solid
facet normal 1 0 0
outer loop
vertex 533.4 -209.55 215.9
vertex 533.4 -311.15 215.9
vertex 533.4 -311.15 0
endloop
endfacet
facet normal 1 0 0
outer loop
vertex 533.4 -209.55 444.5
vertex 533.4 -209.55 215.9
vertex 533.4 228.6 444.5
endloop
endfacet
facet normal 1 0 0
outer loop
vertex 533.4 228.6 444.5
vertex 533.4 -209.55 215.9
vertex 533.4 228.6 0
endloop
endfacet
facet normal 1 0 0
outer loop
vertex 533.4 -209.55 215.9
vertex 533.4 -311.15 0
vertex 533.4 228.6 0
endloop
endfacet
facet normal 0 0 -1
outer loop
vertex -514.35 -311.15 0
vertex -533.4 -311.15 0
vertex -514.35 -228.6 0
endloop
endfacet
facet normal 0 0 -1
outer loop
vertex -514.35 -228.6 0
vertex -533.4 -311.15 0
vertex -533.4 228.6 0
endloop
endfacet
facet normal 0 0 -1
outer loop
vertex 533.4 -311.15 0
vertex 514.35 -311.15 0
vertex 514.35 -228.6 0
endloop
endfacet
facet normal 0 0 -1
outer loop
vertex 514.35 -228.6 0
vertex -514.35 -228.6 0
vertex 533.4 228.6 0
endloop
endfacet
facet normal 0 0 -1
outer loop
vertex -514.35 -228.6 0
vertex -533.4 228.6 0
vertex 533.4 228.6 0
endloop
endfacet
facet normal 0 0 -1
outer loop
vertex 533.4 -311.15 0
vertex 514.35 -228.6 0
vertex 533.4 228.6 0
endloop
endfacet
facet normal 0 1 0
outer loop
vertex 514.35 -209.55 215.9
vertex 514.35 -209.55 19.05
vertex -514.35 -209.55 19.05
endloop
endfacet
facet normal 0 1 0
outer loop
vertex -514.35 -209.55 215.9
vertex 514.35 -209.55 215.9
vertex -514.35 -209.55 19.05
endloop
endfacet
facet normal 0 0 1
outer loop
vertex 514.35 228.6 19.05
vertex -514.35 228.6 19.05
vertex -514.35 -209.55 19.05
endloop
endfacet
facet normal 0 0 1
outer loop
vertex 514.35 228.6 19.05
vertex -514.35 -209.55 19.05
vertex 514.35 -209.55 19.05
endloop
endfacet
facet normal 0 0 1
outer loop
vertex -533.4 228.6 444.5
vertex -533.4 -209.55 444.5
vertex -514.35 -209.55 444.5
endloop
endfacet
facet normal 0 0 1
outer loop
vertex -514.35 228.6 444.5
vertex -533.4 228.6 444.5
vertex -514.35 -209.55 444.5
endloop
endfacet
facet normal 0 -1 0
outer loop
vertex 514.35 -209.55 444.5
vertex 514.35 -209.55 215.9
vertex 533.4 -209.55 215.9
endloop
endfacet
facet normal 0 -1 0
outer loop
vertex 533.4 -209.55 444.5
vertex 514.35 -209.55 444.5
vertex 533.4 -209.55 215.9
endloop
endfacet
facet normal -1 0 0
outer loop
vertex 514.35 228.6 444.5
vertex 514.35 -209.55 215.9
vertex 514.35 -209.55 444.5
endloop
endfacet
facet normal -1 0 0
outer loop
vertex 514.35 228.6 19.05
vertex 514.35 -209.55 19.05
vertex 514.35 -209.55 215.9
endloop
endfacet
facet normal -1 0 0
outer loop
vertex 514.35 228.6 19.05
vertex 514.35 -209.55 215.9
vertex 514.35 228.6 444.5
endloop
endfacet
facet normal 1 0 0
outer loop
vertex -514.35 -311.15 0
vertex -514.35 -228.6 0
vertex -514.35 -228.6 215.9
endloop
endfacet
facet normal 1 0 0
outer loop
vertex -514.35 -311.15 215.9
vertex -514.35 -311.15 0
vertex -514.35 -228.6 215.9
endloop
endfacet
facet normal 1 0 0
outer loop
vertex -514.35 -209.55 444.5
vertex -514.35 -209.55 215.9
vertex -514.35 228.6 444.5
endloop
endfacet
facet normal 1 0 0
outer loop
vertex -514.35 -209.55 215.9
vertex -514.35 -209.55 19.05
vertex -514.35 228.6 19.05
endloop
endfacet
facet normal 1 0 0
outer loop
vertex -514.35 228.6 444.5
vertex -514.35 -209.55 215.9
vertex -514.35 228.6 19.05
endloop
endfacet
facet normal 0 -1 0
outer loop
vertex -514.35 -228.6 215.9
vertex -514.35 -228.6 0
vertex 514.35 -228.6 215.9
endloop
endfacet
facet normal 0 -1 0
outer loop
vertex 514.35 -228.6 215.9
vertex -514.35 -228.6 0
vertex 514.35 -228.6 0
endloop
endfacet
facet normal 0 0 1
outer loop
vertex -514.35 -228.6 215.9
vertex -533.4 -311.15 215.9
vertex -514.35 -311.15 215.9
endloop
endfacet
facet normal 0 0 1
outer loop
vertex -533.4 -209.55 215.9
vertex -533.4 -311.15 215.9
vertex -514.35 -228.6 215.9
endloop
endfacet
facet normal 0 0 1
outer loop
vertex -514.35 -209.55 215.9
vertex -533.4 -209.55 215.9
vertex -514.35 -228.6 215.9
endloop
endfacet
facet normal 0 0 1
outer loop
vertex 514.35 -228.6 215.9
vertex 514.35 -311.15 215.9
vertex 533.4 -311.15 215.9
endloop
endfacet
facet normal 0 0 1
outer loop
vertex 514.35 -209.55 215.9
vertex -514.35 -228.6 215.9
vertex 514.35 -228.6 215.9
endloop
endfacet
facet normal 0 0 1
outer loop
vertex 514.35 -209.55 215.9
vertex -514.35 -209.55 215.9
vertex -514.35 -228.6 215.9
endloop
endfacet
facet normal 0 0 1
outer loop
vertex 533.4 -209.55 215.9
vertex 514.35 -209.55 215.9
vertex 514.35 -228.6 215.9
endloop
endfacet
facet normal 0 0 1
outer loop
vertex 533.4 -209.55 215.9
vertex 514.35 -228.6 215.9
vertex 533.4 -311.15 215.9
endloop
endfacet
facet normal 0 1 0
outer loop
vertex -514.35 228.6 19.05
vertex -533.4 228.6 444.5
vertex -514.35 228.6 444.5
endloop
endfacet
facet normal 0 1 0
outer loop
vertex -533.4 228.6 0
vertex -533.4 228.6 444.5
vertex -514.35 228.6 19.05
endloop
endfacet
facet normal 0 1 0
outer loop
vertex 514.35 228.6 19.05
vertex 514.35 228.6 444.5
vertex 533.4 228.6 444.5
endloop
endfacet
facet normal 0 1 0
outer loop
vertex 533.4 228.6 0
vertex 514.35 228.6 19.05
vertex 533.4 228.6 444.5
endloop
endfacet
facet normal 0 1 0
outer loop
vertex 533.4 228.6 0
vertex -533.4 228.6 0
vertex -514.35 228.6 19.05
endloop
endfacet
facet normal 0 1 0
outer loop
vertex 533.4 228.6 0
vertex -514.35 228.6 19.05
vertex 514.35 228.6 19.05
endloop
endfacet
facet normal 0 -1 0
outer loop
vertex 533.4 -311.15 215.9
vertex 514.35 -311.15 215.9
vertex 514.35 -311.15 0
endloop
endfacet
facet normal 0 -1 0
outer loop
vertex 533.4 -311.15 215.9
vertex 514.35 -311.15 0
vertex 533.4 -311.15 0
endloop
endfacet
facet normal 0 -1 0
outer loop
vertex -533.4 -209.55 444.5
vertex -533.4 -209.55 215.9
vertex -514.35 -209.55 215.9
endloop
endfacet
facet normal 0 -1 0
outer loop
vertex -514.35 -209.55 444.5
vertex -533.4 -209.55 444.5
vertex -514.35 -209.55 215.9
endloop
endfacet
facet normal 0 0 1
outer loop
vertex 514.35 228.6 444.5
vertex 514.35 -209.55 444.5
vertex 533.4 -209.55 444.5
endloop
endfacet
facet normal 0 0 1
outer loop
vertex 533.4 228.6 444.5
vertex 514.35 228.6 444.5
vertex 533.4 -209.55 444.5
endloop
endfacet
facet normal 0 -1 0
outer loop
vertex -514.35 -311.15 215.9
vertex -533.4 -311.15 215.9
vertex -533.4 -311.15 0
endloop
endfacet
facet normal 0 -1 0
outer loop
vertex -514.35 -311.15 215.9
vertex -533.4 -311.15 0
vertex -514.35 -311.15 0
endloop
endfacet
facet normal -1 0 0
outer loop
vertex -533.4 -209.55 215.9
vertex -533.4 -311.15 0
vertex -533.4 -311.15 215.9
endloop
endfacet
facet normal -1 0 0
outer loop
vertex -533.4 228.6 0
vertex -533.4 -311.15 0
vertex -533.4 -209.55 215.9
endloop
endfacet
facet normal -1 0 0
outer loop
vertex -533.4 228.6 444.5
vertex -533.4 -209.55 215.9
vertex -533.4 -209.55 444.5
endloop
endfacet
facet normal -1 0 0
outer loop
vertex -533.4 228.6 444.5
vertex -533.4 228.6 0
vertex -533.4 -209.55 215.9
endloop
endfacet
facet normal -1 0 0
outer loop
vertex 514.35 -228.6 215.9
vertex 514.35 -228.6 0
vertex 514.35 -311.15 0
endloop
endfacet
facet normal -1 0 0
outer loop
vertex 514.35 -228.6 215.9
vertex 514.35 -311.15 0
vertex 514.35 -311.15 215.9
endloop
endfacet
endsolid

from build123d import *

# Parameters (mm, degrees)
F0_W     = 1066.8
F0_H     = 457.2
F1_DEPTH = 19.05
F2_W     = 19.05
F2_H     = 438.15
F3_DEPTH = 425.45
F4_DEPTH = 196.85
F6_W     = 19.05
F6_H     = 215.9
F7_DEPTH = 82.55


with BuildPart() as f1:
    # F0 (on Top) → F1 (new body)
    with BuildSketch(Plane.XY):
        Rectangle(F0_W, F0_H)
    extrude(amount=F1_DEPTH)

    # F2 (on face) → F3 (join)
    with BuildSketch(Plane.XY.offset(19.05)):
        with Locations((523.875, 9.525)):
            Rectangle(F2_W, F2_H)
        with Locations((-523.875, 9.525)):
            Rectangle(F2_W, F2_H)
    extrude(amount=F3_DEPTH)

    # F2 (on face) → F4 (join)
    with BuildSketch(Plane.XY.offset(19.05)):
        Polygon((-514.35, -209.55), (-533.4, -209.55), (-533.4, -228.6), (533.4, -228.6), (533.4, -209.55), (514.35, -209.55), align=None)
    extrude(amount=F4_DEPTH)

    # F6 (on face) → F7 (join)
    with BuildSketch(Plane.XZ.offset(228.6)):
        with Locations((-523.875, 107.95)):
            Rectangle(F6_W, F6_H)
        with Locations((523.875, 107.95)):
            Rectangle(F6_W, F6_H)
    extrude(amount=F7_DEPTH)


solid = f1.part
